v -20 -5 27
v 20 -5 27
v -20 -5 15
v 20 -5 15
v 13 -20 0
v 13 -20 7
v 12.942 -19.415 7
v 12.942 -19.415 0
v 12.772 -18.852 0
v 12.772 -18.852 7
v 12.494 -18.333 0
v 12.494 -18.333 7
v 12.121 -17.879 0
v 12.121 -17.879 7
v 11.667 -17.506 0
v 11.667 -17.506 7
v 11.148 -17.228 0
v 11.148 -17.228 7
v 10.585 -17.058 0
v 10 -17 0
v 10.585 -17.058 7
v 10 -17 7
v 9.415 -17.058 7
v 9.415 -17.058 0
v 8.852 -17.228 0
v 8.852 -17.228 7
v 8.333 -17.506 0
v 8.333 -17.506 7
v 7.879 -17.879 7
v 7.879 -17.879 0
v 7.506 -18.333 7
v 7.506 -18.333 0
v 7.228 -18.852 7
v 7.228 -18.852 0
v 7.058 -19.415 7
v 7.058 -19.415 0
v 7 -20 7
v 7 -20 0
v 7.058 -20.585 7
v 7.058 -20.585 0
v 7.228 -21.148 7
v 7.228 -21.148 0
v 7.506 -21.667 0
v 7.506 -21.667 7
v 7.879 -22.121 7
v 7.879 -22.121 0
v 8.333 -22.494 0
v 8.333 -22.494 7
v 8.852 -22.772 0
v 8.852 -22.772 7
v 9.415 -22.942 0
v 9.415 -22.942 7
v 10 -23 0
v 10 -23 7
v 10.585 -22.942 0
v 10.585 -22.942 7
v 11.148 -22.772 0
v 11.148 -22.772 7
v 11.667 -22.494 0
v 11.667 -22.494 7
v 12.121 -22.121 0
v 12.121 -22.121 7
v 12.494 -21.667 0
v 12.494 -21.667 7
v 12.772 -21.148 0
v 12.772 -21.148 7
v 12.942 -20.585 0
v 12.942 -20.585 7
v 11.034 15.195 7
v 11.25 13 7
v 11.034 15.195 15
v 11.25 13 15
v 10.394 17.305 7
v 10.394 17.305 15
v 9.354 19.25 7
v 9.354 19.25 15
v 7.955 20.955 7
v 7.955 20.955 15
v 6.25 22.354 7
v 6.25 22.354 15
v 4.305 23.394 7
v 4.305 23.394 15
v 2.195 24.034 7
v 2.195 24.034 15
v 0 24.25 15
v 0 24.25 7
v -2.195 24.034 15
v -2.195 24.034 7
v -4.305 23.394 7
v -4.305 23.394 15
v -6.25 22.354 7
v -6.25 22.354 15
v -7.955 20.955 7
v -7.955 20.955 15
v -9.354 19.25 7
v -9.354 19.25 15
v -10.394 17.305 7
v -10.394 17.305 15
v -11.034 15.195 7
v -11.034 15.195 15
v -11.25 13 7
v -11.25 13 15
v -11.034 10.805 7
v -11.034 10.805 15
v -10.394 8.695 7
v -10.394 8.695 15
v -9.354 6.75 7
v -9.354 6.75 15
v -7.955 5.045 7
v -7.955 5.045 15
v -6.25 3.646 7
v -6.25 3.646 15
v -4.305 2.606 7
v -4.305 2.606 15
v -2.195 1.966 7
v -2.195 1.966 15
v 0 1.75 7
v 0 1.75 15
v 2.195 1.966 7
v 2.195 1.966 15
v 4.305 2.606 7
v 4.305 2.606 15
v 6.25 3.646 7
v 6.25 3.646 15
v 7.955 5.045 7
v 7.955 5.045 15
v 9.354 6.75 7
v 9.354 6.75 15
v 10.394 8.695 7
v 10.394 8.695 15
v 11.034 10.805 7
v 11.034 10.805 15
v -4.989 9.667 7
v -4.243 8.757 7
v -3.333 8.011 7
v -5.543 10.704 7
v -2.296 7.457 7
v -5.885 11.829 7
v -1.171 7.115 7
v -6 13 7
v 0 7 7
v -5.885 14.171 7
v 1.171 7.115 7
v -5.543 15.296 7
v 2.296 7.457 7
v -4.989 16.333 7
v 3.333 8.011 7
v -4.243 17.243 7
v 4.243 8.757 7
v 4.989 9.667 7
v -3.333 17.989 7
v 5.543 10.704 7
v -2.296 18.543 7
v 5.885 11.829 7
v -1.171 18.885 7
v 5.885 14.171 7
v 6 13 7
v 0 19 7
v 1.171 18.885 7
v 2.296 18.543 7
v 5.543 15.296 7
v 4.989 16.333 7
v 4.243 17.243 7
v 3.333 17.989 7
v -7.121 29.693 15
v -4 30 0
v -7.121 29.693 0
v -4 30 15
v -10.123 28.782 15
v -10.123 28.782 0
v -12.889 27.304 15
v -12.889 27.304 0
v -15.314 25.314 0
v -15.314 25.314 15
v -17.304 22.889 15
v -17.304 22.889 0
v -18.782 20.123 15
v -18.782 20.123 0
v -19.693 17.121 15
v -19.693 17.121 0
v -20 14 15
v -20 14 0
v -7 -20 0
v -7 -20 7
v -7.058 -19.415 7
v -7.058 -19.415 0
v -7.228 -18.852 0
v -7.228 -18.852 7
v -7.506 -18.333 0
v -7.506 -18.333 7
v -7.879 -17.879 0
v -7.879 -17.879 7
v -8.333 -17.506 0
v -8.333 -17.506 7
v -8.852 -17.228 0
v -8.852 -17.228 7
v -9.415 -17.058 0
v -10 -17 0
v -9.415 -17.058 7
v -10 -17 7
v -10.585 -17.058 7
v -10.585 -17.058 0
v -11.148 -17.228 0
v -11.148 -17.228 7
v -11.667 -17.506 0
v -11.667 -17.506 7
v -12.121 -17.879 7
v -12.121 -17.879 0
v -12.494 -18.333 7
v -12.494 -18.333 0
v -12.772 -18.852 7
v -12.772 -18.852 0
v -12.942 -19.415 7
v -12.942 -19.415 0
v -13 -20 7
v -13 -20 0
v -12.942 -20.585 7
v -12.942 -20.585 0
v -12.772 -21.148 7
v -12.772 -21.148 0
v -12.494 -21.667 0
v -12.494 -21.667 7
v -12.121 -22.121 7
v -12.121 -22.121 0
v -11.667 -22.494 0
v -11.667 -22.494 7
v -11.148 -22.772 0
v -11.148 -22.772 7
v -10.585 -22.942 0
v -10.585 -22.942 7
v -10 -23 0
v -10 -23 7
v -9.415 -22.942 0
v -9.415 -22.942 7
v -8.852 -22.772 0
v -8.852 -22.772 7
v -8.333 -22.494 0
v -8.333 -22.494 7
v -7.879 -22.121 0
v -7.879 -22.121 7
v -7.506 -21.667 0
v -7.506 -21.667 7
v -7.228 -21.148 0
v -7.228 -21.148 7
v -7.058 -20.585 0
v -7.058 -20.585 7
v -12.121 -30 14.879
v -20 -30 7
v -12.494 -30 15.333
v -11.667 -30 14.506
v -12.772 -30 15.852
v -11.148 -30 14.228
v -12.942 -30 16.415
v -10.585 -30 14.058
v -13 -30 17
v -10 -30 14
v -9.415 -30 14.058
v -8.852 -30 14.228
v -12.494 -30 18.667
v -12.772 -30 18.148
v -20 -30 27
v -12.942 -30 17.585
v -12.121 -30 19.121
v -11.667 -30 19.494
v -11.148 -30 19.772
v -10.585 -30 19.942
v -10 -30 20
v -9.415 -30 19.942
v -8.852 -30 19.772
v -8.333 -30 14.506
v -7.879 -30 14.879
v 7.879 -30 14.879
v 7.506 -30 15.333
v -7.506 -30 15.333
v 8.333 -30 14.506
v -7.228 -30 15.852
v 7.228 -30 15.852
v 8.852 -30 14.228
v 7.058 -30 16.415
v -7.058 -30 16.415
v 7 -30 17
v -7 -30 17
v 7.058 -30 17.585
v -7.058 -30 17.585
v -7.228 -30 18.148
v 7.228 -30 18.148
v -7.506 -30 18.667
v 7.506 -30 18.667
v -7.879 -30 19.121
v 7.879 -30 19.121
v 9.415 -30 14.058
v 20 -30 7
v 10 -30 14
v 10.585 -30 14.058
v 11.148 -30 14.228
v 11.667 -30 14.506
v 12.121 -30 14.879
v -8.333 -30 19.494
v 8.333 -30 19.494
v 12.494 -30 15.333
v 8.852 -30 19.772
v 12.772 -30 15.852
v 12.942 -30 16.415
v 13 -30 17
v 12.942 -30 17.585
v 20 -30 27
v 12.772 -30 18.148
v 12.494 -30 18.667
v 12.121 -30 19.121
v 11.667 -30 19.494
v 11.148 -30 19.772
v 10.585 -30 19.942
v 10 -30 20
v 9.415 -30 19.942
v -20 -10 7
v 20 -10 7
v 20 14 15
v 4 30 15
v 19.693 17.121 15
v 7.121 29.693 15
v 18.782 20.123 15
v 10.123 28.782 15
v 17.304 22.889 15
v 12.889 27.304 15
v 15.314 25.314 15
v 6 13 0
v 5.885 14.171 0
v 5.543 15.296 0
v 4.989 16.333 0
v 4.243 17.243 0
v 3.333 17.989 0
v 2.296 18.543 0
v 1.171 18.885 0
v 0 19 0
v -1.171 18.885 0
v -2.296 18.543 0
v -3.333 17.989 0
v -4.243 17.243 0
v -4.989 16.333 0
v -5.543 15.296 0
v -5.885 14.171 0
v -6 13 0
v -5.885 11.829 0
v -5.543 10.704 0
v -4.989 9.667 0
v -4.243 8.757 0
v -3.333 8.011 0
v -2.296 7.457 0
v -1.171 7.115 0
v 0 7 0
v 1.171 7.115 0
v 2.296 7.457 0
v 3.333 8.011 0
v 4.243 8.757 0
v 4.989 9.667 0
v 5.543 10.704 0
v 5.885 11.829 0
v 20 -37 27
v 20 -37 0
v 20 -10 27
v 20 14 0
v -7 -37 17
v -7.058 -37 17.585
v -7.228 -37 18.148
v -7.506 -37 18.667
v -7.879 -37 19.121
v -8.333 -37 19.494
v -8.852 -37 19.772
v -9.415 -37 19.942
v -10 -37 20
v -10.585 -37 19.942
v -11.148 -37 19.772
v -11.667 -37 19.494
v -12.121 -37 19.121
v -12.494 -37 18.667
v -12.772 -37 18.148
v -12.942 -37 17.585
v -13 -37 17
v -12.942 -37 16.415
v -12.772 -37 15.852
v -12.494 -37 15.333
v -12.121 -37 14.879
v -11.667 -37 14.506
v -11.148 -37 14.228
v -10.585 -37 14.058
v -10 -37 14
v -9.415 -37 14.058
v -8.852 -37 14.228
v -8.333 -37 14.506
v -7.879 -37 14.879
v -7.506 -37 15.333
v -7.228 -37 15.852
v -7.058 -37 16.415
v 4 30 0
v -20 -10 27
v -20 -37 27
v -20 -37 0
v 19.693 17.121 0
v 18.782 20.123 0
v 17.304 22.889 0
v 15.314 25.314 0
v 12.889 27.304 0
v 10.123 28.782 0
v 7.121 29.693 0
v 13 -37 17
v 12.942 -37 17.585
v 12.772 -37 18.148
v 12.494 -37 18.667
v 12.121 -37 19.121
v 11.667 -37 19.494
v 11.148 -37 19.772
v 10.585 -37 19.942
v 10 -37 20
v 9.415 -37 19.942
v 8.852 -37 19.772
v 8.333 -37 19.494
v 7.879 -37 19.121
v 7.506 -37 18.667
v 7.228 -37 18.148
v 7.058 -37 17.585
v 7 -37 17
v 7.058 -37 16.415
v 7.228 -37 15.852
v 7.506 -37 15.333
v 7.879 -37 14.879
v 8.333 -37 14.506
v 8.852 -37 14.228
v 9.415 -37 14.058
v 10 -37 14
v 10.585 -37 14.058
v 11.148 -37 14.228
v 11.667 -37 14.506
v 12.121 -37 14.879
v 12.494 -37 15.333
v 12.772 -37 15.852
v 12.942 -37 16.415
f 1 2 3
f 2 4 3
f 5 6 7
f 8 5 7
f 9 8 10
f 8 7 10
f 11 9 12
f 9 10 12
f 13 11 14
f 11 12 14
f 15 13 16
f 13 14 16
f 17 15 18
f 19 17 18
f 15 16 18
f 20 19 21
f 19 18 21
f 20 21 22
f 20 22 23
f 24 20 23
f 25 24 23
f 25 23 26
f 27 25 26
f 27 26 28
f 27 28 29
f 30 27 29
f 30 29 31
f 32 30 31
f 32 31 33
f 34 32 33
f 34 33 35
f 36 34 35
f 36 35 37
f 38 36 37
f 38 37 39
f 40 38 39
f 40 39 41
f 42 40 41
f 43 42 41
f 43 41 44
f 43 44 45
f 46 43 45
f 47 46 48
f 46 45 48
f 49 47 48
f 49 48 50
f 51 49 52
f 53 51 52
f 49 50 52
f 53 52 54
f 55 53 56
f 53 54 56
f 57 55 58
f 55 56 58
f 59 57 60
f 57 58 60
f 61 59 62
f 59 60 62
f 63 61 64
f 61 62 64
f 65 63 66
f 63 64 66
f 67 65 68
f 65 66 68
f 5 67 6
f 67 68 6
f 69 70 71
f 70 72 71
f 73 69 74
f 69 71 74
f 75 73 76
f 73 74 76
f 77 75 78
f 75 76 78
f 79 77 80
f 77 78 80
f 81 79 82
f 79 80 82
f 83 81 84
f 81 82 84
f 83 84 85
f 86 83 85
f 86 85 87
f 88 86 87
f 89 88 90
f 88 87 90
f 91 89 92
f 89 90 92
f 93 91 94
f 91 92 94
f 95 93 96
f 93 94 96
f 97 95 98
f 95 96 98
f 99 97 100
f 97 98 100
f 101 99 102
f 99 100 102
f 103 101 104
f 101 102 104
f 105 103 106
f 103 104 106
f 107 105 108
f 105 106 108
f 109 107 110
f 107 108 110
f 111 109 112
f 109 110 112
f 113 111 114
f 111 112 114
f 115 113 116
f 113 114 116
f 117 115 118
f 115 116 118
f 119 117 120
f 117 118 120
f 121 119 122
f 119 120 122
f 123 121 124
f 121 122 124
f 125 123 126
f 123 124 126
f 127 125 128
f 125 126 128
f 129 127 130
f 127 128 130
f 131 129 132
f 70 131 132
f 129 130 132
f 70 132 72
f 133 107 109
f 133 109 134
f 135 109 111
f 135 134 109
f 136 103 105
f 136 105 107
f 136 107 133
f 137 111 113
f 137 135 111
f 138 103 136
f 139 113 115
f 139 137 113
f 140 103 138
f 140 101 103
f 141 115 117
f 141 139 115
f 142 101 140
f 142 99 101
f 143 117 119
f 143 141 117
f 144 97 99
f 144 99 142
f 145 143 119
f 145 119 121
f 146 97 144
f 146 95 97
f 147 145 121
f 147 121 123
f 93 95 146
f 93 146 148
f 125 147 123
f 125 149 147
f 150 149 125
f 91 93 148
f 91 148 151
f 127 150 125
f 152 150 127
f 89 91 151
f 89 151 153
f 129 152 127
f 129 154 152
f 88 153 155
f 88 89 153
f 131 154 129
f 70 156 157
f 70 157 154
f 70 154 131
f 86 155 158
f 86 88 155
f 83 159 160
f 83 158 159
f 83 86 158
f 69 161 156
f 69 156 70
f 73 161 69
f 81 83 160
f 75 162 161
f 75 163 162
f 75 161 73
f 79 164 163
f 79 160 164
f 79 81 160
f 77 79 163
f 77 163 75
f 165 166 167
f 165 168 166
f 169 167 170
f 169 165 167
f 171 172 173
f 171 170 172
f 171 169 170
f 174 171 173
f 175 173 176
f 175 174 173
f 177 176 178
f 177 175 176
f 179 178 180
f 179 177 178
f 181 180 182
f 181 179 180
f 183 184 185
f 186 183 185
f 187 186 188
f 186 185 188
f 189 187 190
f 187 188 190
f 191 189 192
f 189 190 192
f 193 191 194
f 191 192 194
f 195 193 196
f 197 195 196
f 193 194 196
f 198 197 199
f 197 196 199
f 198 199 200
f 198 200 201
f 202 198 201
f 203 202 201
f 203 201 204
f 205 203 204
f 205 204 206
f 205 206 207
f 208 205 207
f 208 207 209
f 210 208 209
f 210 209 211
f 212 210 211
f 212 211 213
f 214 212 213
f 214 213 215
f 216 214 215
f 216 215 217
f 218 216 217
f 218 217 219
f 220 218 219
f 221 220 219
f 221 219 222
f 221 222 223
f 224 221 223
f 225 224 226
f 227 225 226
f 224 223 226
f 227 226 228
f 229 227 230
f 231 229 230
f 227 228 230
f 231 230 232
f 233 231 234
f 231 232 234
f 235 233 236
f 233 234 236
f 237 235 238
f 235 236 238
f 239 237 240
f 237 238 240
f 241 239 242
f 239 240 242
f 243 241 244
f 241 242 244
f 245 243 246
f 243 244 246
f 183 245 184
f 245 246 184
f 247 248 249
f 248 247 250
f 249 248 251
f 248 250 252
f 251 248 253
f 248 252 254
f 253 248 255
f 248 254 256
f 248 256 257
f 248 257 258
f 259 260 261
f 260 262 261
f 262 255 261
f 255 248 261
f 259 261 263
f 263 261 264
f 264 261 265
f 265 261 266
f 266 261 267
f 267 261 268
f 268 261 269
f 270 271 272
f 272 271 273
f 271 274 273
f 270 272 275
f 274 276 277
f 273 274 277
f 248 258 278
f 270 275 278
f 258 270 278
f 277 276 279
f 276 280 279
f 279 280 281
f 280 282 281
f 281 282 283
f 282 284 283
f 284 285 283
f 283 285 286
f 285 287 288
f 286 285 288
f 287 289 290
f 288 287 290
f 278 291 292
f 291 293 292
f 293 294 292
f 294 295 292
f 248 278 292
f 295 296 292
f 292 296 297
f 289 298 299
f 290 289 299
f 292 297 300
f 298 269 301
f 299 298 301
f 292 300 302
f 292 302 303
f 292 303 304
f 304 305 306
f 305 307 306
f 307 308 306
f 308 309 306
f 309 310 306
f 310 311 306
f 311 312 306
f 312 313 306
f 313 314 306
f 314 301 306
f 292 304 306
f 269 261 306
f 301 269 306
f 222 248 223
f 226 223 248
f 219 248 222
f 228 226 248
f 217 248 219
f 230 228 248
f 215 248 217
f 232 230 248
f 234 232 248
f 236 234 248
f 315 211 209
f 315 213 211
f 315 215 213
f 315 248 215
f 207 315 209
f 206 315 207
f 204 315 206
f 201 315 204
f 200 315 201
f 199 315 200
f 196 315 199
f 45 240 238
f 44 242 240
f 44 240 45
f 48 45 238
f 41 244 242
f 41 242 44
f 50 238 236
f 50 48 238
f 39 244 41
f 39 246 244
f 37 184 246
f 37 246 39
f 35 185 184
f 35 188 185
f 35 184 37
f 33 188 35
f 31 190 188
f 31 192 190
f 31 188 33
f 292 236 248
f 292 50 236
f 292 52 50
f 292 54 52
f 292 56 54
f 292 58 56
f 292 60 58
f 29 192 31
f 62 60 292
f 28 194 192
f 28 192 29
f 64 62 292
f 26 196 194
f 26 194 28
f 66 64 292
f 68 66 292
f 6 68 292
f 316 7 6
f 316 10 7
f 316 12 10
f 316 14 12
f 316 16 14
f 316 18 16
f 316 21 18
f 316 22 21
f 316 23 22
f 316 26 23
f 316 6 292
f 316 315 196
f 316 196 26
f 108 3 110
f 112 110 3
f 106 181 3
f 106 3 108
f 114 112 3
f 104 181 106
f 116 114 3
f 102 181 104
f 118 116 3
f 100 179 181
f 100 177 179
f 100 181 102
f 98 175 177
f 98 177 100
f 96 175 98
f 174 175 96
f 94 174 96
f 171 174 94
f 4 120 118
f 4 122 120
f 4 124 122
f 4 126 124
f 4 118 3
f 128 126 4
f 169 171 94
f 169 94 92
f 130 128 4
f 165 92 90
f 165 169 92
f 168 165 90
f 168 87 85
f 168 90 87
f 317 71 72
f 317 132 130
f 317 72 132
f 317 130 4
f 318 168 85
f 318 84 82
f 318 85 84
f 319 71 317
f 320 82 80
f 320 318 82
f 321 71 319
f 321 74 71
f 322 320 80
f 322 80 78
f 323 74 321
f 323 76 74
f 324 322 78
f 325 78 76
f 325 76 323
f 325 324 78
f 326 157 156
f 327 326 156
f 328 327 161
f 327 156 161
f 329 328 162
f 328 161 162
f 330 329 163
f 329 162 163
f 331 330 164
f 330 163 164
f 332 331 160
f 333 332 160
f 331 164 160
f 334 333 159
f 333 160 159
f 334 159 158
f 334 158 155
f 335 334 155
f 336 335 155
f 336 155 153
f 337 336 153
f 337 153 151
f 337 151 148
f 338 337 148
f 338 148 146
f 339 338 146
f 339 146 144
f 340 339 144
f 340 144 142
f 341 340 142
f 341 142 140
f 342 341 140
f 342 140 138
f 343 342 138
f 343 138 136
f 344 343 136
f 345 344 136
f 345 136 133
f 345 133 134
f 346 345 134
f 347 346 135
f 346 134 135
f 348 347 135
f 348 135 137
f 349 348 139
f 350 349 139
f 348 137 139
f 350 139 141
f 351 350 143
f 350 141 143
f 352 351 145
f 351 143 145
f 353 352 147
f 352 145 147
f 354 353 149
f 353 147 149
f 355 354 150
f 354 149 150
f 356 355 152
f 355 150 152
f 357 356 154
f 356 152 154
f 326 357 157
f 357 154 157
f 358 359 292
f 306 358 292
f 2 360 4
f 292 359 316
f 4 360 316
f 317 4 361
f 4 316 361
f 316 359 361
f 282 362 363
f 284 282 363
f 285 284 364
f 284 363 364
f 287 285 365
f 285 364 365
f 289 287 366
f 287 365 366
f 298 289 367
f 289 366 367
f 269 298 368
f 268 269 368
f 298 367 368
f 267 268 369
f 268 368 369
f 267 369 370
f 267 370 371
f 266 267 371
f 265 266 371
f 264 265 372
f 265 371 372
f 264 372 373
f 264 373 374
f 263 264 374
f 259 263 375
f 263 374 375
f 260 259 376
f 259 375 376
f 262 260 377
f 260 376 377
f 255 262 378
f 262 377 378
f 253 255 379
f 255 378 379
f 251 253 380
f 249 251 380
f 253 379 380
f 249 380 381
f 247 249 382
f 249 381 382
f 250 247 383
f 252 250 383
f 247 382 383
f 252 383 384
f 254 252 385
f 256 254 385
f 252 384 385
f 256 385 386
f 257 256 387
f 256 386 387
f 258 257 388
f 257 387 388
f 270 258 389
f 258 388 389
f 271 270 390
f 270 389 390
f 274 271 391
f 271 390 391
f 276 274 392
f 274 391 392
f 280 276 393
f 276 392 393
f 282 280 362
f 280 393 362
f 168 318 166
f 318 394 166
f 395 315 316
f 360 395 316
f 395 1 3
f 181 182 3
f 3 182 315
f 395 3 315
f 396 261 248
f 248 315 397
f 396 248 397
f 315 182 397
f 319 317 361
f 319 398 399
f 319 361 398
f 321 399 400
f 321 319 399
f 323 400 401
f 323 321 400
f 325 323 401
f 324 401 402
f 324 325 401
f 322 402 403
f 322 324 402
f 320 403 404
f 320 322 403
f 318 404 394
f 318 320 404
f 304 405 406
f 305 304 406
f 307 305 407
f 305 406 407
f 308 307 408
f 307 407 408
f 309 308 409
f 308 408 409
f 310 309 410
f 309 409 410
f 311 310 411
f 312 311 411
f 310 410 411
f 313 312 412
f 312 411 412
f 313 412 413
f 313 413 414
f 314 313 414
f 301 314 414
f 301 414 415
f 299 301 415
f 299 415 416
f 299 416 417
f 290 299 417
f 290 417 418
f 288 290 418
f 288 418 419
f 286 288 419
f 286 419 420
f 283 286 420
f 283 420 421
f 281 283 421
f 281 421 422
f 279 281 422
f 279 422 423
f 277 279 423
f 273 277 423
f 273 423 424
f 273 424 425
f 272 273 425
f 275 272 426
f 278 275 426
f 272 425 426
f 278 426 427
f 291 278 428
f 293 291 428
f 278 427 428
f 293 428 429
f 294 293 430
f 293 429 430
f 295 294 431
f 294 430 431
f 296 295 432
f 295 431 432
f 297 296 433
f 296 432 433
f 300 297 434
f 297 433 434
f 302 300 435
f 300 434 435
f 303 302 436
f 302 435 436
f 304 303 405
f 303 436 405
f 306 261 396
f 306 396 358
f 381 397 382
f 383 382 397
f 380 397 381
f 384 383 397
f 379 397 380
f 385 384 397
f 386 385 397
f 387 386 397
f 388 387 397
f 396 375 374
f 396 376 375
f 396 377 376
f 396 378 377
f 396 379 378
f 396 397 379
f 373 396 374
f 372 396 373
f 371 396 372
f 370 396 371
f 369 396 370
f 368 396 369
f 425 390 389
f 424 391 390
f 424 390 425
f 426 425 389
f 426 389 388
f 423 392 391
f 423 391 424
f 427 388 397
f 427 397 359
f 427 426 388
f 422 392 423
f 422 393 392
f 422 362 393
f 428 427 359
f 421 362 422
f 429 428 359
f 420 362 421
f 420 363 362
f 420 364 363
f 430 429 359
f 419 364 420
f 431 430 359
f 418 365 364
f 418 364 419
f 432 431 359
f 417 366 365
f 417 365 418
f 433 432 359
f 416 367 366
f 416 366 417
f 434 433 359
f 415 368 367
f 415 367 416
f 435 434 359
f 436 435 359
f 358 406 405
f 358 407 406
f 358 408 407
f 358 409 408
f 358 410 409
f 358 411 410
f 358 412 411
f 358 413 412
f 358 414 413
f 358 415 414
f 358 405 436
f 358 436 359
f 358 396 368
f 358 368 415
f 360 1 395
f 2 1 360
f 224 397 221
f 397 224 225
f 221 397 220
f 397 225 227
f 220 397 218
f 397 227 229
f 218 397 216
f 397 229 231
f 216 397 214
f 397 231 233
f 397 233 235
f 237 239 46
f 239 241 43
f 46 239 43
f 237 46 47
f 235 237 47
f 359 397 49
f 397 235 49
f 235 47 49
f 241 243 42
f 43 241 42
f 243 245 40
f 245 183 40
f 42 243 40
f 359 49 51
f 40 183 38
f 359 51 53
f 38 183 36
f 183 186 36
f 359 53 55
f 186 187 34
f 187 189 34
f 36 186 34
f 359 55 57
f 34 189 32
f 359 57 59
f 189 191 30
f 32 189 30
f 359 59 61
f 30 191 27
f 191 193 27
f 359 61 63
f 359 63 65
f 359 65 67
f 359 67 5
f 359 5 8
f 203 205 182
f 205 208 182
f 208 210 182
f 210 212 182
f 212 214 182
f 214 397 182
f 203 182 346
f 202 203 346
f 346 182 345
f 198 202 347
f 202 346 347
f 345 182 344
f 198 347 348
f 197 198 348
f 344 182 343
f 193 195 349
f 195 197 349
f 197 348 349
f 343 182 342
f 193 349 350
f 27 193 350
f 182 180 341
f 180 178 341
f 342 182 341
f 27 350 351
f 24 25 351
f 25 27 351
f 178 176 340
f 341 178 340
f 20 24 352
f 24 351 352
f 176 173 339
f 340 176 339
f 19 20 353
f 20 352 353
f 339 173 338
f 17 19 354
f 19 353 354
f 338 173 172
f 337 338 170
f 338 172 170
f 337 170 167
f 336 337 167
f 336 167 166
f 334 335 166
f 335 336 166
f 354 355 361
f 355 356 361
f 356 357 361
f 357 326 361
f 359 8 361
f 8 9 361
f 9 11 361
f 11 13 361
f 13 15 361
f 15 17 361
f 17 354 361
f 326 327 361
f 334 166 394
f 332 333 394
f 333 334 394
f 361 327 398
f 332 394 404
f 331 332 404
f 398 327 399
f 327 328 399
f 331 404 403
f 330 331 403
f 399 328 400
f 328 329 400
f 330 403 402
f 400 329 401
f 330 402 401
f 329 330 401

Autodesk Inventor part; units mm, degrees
ref_plane "YZ Plane" through (0, 0, 0) normal (1, 0, 0) x (0, 1, 0)
ref_plane "XZ Plane" through (0, 0, 0) normal (0, 1, 0) x (-1, 0, 0)
ref_plane "XY Plane" through (0, 0, 0) normal (0, 0, 1) x (1, 0, 0)
sketch "Sketch1" plane through (0, 0, 0) normal (0, 0, 1) x (1, 0, 0)
  line L0 (-20, -30) -> (20, -30)
  line L1 (20, -30) -> (20, 30)
  line L2 (20, 30) -> (-20, 30)
  line L3 (-20, 30) -> (-20, -30)
  line L4 (-20, -30) -> (20, 30) construction
  line L5 (20, -30) -> (-20, 30) construction
  point P0 (0, 0)
  dimension "d0" = 40
  dimension "d1" = 60
extrude "Extrusion1" add sketch "Sketch1" along normal blind 15
sketch "Sketch2" plane through (0, 0, 15) normal (0, 0, 1) x (1, 0, 0)
  circle A0 centre (0, 13) radius 11.25
  line L0 (-20, -30) -> (20, -30) projected
  point P0 (0, 0)
  dimension "d4" = 22.5
  dimension "d5" = 43
extrude "Extrusion2" cut sketch "Sketch2" against normal blind 8
sketch "Sketch3" plane through (0, 13, 7) normal (0, 0, 1) x (1, 0, 0)
  circle A0 centre (0, 0) radius 6
  point P0 (0, -13)
  dimension "d8" = 12
extrude "Extrusion3" cut sketch "Sketch3" against normal through all
fillet "Fillet1" radius 16 2 edges at (20, 30, 7.5) (-20, 30, 7.5)
sketch "Sketch4" plane through (0, 0, 15) normal (0, 0, 1) x (1, 0, 0)
  line L0 (-20, 14) -> (-20, -30) projected
  line L1 (20, -30) -> (20, 14) projected
  line L2 (-20, -30) -> (20, -30)
  line L3 (20, -30) -> (20, -10)
  line L4 (20, -10) -> (-20, -10)
  line L5 (-20, -10) -> (-20, -30)
  point P0 (0, 0)
  dimension "d12" = 20
extrude "Extrusion4" cut sketch "Sketch4" against normal blind 8
sketch "Sketch5" plane through (-20, -30, 0) normal (0, -1, 0) x (1, 0, 0)
  line L0 (0, 0) -> (40, 0) projected
  line L1 (40, 0) -> (0, 0)
  line L2 (0, 0) -> (0, 27)
  line L3 (0, 27) -> (40, 27)
  line L4 (40, 27) -> (40, 0)
  point P0 (20, 0)
  dimension "d15" = 27
extrude "Extrusion5" add sketch "Sketch5" along normal blind 7
sketch "Sketch6" plane through (0, 0, 7) normal (0, 0, 1) x (1, 0, 0)
  circle A0 centre (-10, -20) radius 3
  circle A1 centre (10, -20) radius 3
  line L0 (20, -30) -> (-20, -30) projected
  line L1 (0, -42) -> (0, 42) projected
  point P0 (0, 0)
  dimension "d19" = 6
  dimension "d20" = 6
  dimension "d21" = 10
  dimension "d22" = 20
  dimension "d23" = 10
  dimension "d24" = 10
extrude "Extrusion6" cut sketch "Sketch6" against normal blind 7
sketch "Sketch7" plane through (-20, -37, 0) normal (0, -1, 0) x (1, 0, 0)
  circle A0 centre (30, 17) radius 3
  circle A1 centre (10, 17) radius 3
  line L0 (40, 27) -> (0, 27) projected
  point P0 (20, 0)
  dimension "d27" = 6
  dimension "d28" = 6
  dimension "d29" = 10
  dimension "d30" = 10
  dimension "d31" = 20
  dimension "d32" = 10
extrude "Extrusion7" cut sketch "Sketch7" against normal blind 7
sketch "Sketch8" plane through (0, 0, 15) normal (0, 0, 1) x (1, 0, 0)
  line L0 (-20, -10) -> (20, -10) projected
  line L1 (20, -10) -> (20, 14) projected
  line L2 (-20, -10) -> (20, -10)
  line L3 (20, -10) -> (20, -5)
  line L4 (20, -5) -> (-20, -5)
  line L5 (-20, -5) -> (-20, -10)
  point P0 (0, 0)
  dimension "d35" = 5
extrude "Extrusion8" add sketch "Sketch8" along normal blind 12
properties part number "Giu truc X"
